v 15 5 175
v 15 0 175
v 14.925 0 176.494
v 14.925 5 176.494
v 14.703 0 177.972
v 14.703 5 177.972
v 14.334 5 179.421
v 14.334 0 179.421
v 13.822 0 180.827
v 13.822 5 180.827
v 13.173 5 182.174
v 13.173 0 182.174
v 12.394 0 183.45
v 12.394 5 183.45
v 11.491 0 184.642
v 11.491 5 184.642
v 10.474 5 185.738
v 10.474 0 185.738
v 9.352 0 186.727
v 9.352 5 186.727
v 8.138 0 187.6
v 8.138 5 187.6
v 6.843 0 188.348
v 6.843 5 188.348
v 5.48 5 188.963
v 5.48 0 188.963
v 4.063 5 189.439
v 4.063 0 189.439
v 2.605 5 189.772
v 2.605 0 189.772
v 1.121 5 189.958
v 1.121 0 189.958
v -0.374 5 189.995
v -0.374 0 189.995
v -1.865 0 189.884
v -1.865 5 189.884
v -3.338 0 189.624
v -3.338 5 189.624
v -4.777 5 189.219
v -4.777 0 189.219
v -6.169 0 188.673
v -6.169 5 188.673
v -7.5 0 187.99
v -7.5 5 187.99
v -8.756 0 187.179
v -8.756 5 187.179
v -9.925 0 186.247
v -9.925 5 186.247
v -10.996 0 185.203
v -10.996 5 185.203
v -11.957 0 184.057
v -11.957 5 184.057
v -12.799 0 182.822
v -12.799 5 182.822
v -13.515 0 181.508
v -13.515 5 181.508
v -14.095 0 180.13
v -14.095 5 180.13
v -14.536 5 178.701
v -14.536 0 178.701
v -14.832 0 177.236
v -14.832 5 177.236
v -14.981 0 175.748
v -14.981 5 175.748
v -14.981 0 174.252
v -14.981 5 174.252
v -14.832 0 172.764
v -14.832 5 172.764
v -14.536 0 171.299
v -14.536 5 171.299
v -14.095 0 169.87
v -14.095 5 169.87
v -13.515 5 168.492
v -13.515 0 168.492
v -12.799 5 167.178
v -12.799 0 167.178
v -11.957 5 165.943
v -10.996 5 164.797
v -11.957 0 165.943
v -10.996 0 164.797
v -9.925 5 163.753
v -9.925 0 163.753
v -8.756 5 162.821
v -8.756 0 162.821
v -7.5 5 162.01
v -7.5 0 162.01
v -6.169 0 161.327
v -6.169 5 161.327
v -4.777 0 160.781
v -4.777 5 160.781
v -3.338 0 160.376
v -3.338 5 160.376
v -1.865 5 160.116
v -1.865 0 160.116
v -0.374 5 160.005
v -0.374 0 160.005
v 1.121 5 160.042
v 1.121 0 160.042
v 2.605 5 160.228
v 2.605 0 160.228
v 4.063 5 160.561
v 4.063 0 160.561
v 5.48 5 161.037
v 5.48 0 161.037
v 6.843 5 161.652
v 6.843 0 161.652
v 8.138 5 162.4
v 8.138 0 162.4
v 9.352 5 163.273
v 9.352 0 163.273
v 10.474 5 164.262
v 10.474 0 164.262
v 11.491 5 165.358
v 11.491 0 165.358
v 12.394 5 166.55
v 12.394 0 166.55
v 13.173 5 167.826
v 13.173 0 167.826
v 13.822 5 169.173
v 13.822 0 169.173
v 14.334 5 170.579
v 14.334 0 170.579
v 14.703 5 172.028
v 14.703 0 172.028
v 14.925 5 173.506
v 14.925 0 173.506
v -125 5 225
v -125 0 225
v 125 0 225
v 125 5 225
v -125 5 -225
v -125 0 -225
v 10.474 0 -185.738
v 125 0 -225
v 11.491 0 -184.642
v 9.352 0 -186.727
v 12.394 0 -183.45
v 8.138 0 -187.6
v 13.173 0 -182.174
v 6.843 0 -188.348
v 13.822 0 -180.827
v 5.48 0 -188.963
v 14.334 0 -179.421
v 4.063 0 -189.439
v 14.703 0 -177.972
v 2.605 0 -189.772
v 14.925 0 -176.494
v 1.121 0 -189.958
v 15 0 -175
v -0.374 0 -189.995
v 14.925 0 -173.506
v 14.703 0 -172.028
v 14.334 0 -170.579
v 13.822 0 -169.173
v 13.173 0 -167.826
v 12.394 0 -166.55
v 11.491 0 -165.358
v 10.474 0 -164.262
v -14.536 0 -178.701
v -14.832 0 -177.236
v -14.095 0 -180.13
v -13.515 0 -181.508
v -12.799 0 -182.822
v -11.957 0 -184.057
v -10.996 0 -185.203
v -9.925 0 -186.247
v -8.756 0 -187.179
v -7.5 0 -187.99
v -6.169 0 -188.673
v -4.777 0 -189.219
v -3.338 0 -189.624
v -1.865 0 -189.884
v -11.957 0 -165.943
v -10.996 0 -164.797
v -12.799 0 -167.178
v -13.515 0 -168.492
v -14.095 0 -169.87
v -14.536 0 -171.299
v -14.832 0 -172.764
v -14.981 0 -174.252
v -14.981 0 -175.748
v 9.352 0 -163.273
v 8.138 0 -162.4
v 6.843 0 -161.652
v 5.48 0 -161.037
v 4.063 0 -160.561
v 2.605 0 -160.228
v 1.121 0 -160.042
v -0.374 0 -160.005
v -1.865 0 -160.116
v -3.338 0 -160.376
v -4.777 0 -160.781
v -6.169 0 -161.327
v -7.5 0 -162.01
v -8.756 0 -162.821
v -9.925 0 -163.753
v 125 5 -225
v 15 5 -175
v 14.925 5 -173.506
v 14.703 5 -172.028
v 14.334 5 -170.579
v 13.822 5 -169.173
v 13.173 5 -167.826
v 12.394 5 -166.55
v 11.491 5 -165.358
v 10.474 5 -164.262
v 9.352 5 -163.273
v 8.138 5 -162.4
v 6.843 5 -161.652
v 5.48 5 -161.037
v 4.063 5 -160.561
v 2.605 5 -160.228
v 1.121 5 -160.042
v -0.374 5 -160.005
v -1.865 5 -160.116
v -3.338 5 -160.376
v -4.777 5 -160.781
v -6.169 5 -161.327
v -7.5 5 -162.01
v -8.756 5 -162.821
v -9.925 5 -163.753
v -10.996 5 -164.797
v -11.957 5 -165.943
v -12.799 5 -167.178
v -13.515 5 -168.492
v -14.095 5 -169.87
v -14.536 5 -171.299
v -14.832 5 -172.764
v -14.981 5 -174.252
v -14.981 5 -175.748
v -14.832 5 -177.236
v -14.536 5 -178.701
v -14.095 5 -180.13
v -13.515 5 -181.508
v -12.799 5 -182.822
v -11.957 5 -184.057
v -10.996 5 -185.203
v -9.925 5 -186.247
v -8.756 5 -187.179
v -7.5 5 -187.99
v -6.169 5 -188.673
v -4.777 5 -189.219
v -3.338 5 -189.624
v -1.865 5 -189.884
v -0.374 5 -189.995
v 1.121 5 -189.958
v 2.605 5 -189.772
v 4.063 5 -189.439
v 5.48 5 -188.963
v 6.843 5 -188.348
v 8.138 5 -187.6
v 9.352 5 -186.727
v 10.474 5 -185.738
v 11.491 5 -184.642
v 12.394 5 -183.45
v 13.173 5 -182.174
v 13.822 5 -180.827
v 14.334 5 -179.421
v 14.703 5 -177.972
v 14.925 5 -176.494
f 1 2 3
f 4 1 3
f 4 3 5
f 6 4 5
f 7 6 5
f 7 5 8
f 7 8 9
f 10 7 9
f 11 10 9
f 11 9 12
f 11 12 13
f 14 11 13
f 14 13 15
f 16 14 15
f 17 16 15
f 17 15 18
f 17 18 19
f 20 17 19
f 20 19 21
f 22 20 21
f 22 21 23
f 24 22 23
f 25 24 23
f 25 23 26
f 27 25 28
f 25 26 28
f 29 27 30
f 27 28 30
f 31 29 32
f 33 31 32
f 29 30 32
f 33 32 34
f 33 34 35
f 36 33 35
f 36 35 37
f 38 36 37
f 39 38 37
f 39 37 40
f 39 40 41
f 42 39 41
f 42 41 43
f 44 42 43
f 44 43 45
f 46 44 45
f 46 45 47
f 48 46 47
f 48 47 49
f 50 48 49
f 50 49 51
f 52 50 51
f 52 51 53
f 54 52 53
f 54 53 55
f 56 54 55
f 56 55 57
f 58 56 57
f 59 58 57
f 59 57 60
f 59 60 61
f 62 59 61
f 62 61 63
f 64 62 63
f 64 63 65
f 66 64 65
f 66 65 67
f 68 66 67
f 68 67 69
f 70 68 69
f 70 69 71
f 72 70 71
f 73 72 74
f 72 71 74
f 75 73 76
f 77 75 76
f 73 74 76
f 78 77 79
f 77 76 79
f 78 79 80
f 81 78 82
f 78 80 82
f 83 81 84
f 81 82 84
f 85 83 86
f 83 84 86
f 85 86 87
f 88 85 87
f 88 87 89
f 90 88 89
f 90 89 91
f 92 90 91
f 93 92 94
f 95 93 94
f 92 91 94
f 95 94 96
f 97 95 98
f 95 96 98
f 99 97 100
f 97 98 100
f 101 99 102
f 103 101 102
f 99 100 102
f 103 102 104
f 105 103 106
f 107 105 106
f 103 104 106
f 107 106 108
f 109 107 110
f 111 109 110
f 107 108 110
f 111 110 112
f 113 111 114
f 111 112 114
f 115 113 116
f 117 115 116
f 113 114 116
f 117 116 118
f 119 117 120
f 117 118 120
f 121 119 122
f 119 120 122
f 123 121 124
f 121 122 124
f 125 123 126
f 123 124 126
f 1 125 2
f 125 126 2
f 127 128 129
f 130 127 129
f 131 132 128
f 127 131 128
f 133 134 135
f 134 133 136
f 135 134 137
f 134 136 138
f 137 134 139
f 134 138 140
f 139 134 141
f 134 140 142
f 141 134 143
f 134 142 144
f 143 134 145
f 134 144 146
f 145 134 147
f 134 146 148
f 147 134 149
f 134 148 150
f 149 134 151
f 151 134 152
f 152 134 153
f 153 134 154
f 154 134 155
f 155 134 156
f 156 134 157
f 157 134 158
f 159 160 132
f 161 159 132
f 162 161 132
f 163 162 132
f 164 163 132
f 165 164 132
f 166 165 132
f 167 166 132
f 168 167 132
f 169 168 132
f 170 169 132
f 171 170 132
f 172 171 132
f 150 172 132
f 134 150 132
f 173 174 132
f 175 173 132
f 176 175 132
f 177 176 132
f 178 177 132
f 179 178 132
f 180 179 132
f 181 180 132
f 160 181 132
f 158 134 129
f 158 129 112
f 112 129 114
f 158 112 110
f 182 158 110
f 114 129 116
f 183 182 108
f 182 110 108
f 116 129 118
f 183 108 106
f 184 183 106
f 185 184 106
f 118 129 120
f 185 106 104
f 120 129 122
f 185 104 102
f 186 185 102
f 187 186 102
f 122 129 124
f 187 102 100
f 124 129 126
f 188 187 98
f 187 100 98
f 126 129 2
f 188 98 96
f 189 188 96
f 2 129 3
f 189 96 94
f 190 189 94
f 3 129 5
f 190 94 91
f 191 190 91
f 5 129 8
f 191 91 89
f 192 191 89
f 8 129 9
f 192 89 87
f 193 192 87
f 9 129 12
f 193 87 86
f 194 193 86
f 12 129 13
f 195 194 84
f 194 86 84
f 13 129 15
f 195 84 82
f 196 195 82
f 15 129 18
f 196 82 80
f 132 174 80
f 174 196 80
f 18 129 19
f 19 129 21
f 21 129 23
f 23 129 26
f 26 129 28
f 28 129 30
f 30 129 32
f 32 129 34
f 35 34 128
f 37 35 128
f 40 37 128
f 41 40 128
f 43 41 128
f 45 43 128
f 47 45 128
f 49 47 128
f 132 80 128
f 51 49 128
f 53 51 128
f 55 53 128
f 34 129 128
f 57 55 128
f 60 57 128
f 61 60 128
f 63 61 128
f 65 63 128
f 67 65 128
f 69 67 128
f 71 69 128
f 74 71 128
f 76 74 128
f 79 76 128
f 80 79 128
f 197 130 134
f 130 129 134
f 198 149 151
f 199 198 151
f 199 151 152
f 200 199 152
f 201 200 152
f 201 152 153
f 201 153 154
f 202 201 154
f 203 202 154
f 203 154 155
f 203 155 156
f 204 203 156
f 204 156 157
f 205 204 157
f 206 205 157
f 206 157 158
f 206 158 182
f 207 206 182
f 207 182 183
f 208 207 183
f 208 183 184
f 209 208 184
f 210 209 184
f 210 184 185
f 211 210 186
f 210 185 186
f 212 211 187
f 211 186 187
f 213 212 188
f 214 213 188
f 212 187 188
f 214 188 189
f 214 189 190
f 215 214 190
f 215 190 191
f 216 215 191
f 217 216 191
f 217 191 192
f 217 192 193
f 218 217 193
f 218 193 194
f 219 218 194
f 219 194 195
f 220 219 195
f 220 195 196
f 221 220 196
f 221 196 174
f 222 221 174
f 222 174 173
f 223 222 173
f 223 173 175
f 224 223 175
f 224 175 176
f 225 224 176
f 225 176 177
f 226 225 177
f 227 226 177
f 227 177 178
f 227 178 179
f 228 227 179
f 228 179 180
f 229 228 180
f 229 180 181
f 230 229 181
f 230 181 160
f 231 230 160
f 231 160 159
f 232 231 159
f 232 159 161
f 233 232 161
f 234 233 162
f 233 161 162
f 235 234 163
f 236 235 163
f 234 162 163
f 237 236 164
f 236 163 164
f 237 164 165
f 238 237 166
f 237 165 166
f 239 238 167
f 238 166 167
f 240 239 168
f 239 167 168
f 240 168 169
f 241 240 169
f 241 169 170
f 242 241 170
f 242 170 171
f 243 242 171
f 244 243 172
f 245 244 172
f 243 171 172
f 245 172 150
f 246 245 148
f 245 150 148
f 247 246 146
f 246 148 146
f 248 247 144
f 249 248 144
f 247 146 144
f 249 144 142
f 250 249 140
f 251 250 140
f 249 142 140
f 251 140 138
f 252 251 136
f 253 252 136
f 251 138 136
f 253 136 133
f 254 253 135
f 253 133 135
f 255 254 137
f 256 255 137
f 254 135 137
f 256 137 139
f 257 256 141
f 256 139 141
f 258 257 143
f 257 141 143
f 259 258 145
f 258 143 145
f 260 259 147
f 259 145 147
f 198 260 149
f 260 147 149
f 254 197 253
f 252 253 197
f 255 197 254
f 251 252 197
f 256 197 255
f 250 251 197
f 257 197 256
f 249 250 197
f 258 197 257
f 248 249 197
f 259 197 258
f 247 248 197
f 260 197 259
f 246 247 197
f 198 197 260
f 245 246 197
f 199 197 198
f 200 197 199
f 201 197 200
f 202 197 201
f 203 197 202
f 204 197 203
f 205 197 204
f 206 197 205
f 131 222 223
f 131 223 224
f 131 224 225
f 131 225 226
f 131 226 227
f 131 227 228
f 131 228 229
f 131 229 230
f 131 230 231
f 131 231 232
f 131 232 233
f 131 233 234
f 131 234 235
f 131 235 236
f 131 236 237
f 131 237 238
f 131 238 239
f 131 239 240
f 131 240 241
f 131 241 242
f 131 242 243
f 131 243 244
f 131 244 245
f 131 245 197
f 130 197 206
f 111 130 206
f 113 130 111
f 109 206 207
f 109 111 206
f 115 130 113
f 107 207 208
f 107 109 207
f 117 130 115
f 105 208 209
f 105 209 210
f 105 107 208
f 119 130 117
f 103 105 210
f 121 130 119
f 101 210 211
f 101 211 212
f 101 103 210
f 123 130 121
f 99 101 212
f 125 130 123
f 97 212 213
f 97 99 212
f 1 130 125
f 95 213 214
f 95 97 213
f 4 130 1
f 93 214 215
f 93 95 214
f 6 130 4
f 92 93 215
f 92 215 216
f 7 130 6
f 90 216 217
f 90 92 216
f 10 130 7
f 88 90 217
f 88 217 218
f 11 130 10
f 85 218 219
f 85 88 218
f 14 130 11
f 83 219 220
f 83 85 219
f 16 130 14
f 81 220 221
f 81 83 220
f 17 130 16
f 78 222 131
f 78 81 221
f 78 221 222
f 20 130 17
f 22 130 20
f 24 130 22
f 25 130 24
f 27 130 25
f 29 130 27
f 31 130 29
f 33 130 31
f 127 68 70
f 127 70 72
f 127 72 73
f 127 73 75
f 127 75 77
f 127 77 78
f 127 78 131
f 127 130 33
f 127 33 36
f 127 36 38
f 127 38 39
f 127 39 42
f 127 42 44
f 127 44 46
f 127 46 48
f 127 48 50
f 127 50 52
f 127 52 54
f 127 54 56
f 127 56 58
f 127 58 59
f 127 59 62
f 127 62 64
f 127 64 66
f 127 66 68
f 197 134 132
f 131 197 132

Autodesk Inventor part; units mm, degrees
ref_plane "YZ Plane" through (0, 0, 0) normal (1, 0, 0) x (0, 1, 0)
ref_plane "XZ Plane" through (0, 0, 0) normal (0, 1, 0) x (-1, 0, 0)
ref_plane "XY Plane" through (0, 0, 0) normal (0, 0, 1) x (1, 0, 0)
sketch "Sketch1" plane through (0, 0, 0) normal (0, 1, 0) x (-1, 0, 0)
  line L0 (125, 225) -> (-125, 225)
  line L1 (-125, 225) -> (-125, -225)
  line L2 (-125, -225) -> (125, -225)
  line L3 (125, -225) -> (125, 225)
  line L4 (125, 225) -> (-125, -225) construction
  line L5 (-125, 225) -> (125, -225) construction
  point P0 (0, 0)
  dimension "d0" = 250
  dimension "d1" = 450
extrude "Extrusion1" add sketch "Sketch1" along normal blind 5
sketch "Sketch2" plane through (0, 0, 0) normal (0, -1, 0) x (1, 0, 0)
  circle A0 centre (0, 175) radius 15
  line L0 (-125, 225) -> (125, 225) projected
  line L1 (-125, 0) -> (125, 0) construction
  line L2 (125, 225) -> (125, -225) construction
  circle A1 centre (0, -175) radius 15
  point P0 (0, 0)
  dimension "d4" = 30
  dimension "d5" = 50
extrude "Extrusion2" cut sketch "Sketch2" against normal blind 5
equation "\"d0\" = boxl"
equation "\"d1\" = boxw"
equation "\"d2\" = pvct"
equation "\"d6\" = pvct"
equation "\"solhole\" = 3"
equation "\"solholespacing\" = 16"
equation "\"ssolw\" = 63"
equation "\"bsoll\" = 126"
equation "\"bsolw\" = 91"
equation "\"bsolh\" = 126"
equation "\"tapl\" = 31"
equation "\"tl\" = 32"
equation "\"eloboww\" = 25"
equation "\"pvct\" = 5"
equation "\"boxw\" = 450"
equation "\"boxl\" = 250"
equation "\"boxh\" = 258"
equation "\"supporth\" = 15"
equation "\"play\" = 0.5"
equation "\"arw\" = 54"
equation "\"arl\" = 102"
equation "\"psuh\" = 85"
equation "\"screenw\" = 197"
equation "\"screenl\" = 115"
equation "\"pcbw\" = 76"
equation "\"pcbl\" = 86"
equation "\"pcbh\" = 46"
equation "\"seph\" = 105"
equation "\"diapowerouter\" = 25"
equation "\"dialoadouter\" = 25"
equation "\"diaetape\" = 25"
equation "\"distpumps\" = 75"
equation "\"diaph\" = 32"
equation "\"diaetapeouter\" = 36"
equation "\"diaphouter\" = 48"
equation "\"diaload\" = 16"
equation "\"distbubblewater\" = 82"
equation "\"diapower\" = 16"
equation "\"pumpinner\" = 16"
equation "\"airoutouter\" = 39"
equation "\"airinouter\" = 39"
equation "\"waterouter\" = 39"
equation "\"airininner\" = 28"
equation "\"waterinner\" = 28"
equation "\"airoutinner\" = 28"
equation "\"pumpouter\" = 25"
properties part number "sb_bottom" material "PVC-Piping"
